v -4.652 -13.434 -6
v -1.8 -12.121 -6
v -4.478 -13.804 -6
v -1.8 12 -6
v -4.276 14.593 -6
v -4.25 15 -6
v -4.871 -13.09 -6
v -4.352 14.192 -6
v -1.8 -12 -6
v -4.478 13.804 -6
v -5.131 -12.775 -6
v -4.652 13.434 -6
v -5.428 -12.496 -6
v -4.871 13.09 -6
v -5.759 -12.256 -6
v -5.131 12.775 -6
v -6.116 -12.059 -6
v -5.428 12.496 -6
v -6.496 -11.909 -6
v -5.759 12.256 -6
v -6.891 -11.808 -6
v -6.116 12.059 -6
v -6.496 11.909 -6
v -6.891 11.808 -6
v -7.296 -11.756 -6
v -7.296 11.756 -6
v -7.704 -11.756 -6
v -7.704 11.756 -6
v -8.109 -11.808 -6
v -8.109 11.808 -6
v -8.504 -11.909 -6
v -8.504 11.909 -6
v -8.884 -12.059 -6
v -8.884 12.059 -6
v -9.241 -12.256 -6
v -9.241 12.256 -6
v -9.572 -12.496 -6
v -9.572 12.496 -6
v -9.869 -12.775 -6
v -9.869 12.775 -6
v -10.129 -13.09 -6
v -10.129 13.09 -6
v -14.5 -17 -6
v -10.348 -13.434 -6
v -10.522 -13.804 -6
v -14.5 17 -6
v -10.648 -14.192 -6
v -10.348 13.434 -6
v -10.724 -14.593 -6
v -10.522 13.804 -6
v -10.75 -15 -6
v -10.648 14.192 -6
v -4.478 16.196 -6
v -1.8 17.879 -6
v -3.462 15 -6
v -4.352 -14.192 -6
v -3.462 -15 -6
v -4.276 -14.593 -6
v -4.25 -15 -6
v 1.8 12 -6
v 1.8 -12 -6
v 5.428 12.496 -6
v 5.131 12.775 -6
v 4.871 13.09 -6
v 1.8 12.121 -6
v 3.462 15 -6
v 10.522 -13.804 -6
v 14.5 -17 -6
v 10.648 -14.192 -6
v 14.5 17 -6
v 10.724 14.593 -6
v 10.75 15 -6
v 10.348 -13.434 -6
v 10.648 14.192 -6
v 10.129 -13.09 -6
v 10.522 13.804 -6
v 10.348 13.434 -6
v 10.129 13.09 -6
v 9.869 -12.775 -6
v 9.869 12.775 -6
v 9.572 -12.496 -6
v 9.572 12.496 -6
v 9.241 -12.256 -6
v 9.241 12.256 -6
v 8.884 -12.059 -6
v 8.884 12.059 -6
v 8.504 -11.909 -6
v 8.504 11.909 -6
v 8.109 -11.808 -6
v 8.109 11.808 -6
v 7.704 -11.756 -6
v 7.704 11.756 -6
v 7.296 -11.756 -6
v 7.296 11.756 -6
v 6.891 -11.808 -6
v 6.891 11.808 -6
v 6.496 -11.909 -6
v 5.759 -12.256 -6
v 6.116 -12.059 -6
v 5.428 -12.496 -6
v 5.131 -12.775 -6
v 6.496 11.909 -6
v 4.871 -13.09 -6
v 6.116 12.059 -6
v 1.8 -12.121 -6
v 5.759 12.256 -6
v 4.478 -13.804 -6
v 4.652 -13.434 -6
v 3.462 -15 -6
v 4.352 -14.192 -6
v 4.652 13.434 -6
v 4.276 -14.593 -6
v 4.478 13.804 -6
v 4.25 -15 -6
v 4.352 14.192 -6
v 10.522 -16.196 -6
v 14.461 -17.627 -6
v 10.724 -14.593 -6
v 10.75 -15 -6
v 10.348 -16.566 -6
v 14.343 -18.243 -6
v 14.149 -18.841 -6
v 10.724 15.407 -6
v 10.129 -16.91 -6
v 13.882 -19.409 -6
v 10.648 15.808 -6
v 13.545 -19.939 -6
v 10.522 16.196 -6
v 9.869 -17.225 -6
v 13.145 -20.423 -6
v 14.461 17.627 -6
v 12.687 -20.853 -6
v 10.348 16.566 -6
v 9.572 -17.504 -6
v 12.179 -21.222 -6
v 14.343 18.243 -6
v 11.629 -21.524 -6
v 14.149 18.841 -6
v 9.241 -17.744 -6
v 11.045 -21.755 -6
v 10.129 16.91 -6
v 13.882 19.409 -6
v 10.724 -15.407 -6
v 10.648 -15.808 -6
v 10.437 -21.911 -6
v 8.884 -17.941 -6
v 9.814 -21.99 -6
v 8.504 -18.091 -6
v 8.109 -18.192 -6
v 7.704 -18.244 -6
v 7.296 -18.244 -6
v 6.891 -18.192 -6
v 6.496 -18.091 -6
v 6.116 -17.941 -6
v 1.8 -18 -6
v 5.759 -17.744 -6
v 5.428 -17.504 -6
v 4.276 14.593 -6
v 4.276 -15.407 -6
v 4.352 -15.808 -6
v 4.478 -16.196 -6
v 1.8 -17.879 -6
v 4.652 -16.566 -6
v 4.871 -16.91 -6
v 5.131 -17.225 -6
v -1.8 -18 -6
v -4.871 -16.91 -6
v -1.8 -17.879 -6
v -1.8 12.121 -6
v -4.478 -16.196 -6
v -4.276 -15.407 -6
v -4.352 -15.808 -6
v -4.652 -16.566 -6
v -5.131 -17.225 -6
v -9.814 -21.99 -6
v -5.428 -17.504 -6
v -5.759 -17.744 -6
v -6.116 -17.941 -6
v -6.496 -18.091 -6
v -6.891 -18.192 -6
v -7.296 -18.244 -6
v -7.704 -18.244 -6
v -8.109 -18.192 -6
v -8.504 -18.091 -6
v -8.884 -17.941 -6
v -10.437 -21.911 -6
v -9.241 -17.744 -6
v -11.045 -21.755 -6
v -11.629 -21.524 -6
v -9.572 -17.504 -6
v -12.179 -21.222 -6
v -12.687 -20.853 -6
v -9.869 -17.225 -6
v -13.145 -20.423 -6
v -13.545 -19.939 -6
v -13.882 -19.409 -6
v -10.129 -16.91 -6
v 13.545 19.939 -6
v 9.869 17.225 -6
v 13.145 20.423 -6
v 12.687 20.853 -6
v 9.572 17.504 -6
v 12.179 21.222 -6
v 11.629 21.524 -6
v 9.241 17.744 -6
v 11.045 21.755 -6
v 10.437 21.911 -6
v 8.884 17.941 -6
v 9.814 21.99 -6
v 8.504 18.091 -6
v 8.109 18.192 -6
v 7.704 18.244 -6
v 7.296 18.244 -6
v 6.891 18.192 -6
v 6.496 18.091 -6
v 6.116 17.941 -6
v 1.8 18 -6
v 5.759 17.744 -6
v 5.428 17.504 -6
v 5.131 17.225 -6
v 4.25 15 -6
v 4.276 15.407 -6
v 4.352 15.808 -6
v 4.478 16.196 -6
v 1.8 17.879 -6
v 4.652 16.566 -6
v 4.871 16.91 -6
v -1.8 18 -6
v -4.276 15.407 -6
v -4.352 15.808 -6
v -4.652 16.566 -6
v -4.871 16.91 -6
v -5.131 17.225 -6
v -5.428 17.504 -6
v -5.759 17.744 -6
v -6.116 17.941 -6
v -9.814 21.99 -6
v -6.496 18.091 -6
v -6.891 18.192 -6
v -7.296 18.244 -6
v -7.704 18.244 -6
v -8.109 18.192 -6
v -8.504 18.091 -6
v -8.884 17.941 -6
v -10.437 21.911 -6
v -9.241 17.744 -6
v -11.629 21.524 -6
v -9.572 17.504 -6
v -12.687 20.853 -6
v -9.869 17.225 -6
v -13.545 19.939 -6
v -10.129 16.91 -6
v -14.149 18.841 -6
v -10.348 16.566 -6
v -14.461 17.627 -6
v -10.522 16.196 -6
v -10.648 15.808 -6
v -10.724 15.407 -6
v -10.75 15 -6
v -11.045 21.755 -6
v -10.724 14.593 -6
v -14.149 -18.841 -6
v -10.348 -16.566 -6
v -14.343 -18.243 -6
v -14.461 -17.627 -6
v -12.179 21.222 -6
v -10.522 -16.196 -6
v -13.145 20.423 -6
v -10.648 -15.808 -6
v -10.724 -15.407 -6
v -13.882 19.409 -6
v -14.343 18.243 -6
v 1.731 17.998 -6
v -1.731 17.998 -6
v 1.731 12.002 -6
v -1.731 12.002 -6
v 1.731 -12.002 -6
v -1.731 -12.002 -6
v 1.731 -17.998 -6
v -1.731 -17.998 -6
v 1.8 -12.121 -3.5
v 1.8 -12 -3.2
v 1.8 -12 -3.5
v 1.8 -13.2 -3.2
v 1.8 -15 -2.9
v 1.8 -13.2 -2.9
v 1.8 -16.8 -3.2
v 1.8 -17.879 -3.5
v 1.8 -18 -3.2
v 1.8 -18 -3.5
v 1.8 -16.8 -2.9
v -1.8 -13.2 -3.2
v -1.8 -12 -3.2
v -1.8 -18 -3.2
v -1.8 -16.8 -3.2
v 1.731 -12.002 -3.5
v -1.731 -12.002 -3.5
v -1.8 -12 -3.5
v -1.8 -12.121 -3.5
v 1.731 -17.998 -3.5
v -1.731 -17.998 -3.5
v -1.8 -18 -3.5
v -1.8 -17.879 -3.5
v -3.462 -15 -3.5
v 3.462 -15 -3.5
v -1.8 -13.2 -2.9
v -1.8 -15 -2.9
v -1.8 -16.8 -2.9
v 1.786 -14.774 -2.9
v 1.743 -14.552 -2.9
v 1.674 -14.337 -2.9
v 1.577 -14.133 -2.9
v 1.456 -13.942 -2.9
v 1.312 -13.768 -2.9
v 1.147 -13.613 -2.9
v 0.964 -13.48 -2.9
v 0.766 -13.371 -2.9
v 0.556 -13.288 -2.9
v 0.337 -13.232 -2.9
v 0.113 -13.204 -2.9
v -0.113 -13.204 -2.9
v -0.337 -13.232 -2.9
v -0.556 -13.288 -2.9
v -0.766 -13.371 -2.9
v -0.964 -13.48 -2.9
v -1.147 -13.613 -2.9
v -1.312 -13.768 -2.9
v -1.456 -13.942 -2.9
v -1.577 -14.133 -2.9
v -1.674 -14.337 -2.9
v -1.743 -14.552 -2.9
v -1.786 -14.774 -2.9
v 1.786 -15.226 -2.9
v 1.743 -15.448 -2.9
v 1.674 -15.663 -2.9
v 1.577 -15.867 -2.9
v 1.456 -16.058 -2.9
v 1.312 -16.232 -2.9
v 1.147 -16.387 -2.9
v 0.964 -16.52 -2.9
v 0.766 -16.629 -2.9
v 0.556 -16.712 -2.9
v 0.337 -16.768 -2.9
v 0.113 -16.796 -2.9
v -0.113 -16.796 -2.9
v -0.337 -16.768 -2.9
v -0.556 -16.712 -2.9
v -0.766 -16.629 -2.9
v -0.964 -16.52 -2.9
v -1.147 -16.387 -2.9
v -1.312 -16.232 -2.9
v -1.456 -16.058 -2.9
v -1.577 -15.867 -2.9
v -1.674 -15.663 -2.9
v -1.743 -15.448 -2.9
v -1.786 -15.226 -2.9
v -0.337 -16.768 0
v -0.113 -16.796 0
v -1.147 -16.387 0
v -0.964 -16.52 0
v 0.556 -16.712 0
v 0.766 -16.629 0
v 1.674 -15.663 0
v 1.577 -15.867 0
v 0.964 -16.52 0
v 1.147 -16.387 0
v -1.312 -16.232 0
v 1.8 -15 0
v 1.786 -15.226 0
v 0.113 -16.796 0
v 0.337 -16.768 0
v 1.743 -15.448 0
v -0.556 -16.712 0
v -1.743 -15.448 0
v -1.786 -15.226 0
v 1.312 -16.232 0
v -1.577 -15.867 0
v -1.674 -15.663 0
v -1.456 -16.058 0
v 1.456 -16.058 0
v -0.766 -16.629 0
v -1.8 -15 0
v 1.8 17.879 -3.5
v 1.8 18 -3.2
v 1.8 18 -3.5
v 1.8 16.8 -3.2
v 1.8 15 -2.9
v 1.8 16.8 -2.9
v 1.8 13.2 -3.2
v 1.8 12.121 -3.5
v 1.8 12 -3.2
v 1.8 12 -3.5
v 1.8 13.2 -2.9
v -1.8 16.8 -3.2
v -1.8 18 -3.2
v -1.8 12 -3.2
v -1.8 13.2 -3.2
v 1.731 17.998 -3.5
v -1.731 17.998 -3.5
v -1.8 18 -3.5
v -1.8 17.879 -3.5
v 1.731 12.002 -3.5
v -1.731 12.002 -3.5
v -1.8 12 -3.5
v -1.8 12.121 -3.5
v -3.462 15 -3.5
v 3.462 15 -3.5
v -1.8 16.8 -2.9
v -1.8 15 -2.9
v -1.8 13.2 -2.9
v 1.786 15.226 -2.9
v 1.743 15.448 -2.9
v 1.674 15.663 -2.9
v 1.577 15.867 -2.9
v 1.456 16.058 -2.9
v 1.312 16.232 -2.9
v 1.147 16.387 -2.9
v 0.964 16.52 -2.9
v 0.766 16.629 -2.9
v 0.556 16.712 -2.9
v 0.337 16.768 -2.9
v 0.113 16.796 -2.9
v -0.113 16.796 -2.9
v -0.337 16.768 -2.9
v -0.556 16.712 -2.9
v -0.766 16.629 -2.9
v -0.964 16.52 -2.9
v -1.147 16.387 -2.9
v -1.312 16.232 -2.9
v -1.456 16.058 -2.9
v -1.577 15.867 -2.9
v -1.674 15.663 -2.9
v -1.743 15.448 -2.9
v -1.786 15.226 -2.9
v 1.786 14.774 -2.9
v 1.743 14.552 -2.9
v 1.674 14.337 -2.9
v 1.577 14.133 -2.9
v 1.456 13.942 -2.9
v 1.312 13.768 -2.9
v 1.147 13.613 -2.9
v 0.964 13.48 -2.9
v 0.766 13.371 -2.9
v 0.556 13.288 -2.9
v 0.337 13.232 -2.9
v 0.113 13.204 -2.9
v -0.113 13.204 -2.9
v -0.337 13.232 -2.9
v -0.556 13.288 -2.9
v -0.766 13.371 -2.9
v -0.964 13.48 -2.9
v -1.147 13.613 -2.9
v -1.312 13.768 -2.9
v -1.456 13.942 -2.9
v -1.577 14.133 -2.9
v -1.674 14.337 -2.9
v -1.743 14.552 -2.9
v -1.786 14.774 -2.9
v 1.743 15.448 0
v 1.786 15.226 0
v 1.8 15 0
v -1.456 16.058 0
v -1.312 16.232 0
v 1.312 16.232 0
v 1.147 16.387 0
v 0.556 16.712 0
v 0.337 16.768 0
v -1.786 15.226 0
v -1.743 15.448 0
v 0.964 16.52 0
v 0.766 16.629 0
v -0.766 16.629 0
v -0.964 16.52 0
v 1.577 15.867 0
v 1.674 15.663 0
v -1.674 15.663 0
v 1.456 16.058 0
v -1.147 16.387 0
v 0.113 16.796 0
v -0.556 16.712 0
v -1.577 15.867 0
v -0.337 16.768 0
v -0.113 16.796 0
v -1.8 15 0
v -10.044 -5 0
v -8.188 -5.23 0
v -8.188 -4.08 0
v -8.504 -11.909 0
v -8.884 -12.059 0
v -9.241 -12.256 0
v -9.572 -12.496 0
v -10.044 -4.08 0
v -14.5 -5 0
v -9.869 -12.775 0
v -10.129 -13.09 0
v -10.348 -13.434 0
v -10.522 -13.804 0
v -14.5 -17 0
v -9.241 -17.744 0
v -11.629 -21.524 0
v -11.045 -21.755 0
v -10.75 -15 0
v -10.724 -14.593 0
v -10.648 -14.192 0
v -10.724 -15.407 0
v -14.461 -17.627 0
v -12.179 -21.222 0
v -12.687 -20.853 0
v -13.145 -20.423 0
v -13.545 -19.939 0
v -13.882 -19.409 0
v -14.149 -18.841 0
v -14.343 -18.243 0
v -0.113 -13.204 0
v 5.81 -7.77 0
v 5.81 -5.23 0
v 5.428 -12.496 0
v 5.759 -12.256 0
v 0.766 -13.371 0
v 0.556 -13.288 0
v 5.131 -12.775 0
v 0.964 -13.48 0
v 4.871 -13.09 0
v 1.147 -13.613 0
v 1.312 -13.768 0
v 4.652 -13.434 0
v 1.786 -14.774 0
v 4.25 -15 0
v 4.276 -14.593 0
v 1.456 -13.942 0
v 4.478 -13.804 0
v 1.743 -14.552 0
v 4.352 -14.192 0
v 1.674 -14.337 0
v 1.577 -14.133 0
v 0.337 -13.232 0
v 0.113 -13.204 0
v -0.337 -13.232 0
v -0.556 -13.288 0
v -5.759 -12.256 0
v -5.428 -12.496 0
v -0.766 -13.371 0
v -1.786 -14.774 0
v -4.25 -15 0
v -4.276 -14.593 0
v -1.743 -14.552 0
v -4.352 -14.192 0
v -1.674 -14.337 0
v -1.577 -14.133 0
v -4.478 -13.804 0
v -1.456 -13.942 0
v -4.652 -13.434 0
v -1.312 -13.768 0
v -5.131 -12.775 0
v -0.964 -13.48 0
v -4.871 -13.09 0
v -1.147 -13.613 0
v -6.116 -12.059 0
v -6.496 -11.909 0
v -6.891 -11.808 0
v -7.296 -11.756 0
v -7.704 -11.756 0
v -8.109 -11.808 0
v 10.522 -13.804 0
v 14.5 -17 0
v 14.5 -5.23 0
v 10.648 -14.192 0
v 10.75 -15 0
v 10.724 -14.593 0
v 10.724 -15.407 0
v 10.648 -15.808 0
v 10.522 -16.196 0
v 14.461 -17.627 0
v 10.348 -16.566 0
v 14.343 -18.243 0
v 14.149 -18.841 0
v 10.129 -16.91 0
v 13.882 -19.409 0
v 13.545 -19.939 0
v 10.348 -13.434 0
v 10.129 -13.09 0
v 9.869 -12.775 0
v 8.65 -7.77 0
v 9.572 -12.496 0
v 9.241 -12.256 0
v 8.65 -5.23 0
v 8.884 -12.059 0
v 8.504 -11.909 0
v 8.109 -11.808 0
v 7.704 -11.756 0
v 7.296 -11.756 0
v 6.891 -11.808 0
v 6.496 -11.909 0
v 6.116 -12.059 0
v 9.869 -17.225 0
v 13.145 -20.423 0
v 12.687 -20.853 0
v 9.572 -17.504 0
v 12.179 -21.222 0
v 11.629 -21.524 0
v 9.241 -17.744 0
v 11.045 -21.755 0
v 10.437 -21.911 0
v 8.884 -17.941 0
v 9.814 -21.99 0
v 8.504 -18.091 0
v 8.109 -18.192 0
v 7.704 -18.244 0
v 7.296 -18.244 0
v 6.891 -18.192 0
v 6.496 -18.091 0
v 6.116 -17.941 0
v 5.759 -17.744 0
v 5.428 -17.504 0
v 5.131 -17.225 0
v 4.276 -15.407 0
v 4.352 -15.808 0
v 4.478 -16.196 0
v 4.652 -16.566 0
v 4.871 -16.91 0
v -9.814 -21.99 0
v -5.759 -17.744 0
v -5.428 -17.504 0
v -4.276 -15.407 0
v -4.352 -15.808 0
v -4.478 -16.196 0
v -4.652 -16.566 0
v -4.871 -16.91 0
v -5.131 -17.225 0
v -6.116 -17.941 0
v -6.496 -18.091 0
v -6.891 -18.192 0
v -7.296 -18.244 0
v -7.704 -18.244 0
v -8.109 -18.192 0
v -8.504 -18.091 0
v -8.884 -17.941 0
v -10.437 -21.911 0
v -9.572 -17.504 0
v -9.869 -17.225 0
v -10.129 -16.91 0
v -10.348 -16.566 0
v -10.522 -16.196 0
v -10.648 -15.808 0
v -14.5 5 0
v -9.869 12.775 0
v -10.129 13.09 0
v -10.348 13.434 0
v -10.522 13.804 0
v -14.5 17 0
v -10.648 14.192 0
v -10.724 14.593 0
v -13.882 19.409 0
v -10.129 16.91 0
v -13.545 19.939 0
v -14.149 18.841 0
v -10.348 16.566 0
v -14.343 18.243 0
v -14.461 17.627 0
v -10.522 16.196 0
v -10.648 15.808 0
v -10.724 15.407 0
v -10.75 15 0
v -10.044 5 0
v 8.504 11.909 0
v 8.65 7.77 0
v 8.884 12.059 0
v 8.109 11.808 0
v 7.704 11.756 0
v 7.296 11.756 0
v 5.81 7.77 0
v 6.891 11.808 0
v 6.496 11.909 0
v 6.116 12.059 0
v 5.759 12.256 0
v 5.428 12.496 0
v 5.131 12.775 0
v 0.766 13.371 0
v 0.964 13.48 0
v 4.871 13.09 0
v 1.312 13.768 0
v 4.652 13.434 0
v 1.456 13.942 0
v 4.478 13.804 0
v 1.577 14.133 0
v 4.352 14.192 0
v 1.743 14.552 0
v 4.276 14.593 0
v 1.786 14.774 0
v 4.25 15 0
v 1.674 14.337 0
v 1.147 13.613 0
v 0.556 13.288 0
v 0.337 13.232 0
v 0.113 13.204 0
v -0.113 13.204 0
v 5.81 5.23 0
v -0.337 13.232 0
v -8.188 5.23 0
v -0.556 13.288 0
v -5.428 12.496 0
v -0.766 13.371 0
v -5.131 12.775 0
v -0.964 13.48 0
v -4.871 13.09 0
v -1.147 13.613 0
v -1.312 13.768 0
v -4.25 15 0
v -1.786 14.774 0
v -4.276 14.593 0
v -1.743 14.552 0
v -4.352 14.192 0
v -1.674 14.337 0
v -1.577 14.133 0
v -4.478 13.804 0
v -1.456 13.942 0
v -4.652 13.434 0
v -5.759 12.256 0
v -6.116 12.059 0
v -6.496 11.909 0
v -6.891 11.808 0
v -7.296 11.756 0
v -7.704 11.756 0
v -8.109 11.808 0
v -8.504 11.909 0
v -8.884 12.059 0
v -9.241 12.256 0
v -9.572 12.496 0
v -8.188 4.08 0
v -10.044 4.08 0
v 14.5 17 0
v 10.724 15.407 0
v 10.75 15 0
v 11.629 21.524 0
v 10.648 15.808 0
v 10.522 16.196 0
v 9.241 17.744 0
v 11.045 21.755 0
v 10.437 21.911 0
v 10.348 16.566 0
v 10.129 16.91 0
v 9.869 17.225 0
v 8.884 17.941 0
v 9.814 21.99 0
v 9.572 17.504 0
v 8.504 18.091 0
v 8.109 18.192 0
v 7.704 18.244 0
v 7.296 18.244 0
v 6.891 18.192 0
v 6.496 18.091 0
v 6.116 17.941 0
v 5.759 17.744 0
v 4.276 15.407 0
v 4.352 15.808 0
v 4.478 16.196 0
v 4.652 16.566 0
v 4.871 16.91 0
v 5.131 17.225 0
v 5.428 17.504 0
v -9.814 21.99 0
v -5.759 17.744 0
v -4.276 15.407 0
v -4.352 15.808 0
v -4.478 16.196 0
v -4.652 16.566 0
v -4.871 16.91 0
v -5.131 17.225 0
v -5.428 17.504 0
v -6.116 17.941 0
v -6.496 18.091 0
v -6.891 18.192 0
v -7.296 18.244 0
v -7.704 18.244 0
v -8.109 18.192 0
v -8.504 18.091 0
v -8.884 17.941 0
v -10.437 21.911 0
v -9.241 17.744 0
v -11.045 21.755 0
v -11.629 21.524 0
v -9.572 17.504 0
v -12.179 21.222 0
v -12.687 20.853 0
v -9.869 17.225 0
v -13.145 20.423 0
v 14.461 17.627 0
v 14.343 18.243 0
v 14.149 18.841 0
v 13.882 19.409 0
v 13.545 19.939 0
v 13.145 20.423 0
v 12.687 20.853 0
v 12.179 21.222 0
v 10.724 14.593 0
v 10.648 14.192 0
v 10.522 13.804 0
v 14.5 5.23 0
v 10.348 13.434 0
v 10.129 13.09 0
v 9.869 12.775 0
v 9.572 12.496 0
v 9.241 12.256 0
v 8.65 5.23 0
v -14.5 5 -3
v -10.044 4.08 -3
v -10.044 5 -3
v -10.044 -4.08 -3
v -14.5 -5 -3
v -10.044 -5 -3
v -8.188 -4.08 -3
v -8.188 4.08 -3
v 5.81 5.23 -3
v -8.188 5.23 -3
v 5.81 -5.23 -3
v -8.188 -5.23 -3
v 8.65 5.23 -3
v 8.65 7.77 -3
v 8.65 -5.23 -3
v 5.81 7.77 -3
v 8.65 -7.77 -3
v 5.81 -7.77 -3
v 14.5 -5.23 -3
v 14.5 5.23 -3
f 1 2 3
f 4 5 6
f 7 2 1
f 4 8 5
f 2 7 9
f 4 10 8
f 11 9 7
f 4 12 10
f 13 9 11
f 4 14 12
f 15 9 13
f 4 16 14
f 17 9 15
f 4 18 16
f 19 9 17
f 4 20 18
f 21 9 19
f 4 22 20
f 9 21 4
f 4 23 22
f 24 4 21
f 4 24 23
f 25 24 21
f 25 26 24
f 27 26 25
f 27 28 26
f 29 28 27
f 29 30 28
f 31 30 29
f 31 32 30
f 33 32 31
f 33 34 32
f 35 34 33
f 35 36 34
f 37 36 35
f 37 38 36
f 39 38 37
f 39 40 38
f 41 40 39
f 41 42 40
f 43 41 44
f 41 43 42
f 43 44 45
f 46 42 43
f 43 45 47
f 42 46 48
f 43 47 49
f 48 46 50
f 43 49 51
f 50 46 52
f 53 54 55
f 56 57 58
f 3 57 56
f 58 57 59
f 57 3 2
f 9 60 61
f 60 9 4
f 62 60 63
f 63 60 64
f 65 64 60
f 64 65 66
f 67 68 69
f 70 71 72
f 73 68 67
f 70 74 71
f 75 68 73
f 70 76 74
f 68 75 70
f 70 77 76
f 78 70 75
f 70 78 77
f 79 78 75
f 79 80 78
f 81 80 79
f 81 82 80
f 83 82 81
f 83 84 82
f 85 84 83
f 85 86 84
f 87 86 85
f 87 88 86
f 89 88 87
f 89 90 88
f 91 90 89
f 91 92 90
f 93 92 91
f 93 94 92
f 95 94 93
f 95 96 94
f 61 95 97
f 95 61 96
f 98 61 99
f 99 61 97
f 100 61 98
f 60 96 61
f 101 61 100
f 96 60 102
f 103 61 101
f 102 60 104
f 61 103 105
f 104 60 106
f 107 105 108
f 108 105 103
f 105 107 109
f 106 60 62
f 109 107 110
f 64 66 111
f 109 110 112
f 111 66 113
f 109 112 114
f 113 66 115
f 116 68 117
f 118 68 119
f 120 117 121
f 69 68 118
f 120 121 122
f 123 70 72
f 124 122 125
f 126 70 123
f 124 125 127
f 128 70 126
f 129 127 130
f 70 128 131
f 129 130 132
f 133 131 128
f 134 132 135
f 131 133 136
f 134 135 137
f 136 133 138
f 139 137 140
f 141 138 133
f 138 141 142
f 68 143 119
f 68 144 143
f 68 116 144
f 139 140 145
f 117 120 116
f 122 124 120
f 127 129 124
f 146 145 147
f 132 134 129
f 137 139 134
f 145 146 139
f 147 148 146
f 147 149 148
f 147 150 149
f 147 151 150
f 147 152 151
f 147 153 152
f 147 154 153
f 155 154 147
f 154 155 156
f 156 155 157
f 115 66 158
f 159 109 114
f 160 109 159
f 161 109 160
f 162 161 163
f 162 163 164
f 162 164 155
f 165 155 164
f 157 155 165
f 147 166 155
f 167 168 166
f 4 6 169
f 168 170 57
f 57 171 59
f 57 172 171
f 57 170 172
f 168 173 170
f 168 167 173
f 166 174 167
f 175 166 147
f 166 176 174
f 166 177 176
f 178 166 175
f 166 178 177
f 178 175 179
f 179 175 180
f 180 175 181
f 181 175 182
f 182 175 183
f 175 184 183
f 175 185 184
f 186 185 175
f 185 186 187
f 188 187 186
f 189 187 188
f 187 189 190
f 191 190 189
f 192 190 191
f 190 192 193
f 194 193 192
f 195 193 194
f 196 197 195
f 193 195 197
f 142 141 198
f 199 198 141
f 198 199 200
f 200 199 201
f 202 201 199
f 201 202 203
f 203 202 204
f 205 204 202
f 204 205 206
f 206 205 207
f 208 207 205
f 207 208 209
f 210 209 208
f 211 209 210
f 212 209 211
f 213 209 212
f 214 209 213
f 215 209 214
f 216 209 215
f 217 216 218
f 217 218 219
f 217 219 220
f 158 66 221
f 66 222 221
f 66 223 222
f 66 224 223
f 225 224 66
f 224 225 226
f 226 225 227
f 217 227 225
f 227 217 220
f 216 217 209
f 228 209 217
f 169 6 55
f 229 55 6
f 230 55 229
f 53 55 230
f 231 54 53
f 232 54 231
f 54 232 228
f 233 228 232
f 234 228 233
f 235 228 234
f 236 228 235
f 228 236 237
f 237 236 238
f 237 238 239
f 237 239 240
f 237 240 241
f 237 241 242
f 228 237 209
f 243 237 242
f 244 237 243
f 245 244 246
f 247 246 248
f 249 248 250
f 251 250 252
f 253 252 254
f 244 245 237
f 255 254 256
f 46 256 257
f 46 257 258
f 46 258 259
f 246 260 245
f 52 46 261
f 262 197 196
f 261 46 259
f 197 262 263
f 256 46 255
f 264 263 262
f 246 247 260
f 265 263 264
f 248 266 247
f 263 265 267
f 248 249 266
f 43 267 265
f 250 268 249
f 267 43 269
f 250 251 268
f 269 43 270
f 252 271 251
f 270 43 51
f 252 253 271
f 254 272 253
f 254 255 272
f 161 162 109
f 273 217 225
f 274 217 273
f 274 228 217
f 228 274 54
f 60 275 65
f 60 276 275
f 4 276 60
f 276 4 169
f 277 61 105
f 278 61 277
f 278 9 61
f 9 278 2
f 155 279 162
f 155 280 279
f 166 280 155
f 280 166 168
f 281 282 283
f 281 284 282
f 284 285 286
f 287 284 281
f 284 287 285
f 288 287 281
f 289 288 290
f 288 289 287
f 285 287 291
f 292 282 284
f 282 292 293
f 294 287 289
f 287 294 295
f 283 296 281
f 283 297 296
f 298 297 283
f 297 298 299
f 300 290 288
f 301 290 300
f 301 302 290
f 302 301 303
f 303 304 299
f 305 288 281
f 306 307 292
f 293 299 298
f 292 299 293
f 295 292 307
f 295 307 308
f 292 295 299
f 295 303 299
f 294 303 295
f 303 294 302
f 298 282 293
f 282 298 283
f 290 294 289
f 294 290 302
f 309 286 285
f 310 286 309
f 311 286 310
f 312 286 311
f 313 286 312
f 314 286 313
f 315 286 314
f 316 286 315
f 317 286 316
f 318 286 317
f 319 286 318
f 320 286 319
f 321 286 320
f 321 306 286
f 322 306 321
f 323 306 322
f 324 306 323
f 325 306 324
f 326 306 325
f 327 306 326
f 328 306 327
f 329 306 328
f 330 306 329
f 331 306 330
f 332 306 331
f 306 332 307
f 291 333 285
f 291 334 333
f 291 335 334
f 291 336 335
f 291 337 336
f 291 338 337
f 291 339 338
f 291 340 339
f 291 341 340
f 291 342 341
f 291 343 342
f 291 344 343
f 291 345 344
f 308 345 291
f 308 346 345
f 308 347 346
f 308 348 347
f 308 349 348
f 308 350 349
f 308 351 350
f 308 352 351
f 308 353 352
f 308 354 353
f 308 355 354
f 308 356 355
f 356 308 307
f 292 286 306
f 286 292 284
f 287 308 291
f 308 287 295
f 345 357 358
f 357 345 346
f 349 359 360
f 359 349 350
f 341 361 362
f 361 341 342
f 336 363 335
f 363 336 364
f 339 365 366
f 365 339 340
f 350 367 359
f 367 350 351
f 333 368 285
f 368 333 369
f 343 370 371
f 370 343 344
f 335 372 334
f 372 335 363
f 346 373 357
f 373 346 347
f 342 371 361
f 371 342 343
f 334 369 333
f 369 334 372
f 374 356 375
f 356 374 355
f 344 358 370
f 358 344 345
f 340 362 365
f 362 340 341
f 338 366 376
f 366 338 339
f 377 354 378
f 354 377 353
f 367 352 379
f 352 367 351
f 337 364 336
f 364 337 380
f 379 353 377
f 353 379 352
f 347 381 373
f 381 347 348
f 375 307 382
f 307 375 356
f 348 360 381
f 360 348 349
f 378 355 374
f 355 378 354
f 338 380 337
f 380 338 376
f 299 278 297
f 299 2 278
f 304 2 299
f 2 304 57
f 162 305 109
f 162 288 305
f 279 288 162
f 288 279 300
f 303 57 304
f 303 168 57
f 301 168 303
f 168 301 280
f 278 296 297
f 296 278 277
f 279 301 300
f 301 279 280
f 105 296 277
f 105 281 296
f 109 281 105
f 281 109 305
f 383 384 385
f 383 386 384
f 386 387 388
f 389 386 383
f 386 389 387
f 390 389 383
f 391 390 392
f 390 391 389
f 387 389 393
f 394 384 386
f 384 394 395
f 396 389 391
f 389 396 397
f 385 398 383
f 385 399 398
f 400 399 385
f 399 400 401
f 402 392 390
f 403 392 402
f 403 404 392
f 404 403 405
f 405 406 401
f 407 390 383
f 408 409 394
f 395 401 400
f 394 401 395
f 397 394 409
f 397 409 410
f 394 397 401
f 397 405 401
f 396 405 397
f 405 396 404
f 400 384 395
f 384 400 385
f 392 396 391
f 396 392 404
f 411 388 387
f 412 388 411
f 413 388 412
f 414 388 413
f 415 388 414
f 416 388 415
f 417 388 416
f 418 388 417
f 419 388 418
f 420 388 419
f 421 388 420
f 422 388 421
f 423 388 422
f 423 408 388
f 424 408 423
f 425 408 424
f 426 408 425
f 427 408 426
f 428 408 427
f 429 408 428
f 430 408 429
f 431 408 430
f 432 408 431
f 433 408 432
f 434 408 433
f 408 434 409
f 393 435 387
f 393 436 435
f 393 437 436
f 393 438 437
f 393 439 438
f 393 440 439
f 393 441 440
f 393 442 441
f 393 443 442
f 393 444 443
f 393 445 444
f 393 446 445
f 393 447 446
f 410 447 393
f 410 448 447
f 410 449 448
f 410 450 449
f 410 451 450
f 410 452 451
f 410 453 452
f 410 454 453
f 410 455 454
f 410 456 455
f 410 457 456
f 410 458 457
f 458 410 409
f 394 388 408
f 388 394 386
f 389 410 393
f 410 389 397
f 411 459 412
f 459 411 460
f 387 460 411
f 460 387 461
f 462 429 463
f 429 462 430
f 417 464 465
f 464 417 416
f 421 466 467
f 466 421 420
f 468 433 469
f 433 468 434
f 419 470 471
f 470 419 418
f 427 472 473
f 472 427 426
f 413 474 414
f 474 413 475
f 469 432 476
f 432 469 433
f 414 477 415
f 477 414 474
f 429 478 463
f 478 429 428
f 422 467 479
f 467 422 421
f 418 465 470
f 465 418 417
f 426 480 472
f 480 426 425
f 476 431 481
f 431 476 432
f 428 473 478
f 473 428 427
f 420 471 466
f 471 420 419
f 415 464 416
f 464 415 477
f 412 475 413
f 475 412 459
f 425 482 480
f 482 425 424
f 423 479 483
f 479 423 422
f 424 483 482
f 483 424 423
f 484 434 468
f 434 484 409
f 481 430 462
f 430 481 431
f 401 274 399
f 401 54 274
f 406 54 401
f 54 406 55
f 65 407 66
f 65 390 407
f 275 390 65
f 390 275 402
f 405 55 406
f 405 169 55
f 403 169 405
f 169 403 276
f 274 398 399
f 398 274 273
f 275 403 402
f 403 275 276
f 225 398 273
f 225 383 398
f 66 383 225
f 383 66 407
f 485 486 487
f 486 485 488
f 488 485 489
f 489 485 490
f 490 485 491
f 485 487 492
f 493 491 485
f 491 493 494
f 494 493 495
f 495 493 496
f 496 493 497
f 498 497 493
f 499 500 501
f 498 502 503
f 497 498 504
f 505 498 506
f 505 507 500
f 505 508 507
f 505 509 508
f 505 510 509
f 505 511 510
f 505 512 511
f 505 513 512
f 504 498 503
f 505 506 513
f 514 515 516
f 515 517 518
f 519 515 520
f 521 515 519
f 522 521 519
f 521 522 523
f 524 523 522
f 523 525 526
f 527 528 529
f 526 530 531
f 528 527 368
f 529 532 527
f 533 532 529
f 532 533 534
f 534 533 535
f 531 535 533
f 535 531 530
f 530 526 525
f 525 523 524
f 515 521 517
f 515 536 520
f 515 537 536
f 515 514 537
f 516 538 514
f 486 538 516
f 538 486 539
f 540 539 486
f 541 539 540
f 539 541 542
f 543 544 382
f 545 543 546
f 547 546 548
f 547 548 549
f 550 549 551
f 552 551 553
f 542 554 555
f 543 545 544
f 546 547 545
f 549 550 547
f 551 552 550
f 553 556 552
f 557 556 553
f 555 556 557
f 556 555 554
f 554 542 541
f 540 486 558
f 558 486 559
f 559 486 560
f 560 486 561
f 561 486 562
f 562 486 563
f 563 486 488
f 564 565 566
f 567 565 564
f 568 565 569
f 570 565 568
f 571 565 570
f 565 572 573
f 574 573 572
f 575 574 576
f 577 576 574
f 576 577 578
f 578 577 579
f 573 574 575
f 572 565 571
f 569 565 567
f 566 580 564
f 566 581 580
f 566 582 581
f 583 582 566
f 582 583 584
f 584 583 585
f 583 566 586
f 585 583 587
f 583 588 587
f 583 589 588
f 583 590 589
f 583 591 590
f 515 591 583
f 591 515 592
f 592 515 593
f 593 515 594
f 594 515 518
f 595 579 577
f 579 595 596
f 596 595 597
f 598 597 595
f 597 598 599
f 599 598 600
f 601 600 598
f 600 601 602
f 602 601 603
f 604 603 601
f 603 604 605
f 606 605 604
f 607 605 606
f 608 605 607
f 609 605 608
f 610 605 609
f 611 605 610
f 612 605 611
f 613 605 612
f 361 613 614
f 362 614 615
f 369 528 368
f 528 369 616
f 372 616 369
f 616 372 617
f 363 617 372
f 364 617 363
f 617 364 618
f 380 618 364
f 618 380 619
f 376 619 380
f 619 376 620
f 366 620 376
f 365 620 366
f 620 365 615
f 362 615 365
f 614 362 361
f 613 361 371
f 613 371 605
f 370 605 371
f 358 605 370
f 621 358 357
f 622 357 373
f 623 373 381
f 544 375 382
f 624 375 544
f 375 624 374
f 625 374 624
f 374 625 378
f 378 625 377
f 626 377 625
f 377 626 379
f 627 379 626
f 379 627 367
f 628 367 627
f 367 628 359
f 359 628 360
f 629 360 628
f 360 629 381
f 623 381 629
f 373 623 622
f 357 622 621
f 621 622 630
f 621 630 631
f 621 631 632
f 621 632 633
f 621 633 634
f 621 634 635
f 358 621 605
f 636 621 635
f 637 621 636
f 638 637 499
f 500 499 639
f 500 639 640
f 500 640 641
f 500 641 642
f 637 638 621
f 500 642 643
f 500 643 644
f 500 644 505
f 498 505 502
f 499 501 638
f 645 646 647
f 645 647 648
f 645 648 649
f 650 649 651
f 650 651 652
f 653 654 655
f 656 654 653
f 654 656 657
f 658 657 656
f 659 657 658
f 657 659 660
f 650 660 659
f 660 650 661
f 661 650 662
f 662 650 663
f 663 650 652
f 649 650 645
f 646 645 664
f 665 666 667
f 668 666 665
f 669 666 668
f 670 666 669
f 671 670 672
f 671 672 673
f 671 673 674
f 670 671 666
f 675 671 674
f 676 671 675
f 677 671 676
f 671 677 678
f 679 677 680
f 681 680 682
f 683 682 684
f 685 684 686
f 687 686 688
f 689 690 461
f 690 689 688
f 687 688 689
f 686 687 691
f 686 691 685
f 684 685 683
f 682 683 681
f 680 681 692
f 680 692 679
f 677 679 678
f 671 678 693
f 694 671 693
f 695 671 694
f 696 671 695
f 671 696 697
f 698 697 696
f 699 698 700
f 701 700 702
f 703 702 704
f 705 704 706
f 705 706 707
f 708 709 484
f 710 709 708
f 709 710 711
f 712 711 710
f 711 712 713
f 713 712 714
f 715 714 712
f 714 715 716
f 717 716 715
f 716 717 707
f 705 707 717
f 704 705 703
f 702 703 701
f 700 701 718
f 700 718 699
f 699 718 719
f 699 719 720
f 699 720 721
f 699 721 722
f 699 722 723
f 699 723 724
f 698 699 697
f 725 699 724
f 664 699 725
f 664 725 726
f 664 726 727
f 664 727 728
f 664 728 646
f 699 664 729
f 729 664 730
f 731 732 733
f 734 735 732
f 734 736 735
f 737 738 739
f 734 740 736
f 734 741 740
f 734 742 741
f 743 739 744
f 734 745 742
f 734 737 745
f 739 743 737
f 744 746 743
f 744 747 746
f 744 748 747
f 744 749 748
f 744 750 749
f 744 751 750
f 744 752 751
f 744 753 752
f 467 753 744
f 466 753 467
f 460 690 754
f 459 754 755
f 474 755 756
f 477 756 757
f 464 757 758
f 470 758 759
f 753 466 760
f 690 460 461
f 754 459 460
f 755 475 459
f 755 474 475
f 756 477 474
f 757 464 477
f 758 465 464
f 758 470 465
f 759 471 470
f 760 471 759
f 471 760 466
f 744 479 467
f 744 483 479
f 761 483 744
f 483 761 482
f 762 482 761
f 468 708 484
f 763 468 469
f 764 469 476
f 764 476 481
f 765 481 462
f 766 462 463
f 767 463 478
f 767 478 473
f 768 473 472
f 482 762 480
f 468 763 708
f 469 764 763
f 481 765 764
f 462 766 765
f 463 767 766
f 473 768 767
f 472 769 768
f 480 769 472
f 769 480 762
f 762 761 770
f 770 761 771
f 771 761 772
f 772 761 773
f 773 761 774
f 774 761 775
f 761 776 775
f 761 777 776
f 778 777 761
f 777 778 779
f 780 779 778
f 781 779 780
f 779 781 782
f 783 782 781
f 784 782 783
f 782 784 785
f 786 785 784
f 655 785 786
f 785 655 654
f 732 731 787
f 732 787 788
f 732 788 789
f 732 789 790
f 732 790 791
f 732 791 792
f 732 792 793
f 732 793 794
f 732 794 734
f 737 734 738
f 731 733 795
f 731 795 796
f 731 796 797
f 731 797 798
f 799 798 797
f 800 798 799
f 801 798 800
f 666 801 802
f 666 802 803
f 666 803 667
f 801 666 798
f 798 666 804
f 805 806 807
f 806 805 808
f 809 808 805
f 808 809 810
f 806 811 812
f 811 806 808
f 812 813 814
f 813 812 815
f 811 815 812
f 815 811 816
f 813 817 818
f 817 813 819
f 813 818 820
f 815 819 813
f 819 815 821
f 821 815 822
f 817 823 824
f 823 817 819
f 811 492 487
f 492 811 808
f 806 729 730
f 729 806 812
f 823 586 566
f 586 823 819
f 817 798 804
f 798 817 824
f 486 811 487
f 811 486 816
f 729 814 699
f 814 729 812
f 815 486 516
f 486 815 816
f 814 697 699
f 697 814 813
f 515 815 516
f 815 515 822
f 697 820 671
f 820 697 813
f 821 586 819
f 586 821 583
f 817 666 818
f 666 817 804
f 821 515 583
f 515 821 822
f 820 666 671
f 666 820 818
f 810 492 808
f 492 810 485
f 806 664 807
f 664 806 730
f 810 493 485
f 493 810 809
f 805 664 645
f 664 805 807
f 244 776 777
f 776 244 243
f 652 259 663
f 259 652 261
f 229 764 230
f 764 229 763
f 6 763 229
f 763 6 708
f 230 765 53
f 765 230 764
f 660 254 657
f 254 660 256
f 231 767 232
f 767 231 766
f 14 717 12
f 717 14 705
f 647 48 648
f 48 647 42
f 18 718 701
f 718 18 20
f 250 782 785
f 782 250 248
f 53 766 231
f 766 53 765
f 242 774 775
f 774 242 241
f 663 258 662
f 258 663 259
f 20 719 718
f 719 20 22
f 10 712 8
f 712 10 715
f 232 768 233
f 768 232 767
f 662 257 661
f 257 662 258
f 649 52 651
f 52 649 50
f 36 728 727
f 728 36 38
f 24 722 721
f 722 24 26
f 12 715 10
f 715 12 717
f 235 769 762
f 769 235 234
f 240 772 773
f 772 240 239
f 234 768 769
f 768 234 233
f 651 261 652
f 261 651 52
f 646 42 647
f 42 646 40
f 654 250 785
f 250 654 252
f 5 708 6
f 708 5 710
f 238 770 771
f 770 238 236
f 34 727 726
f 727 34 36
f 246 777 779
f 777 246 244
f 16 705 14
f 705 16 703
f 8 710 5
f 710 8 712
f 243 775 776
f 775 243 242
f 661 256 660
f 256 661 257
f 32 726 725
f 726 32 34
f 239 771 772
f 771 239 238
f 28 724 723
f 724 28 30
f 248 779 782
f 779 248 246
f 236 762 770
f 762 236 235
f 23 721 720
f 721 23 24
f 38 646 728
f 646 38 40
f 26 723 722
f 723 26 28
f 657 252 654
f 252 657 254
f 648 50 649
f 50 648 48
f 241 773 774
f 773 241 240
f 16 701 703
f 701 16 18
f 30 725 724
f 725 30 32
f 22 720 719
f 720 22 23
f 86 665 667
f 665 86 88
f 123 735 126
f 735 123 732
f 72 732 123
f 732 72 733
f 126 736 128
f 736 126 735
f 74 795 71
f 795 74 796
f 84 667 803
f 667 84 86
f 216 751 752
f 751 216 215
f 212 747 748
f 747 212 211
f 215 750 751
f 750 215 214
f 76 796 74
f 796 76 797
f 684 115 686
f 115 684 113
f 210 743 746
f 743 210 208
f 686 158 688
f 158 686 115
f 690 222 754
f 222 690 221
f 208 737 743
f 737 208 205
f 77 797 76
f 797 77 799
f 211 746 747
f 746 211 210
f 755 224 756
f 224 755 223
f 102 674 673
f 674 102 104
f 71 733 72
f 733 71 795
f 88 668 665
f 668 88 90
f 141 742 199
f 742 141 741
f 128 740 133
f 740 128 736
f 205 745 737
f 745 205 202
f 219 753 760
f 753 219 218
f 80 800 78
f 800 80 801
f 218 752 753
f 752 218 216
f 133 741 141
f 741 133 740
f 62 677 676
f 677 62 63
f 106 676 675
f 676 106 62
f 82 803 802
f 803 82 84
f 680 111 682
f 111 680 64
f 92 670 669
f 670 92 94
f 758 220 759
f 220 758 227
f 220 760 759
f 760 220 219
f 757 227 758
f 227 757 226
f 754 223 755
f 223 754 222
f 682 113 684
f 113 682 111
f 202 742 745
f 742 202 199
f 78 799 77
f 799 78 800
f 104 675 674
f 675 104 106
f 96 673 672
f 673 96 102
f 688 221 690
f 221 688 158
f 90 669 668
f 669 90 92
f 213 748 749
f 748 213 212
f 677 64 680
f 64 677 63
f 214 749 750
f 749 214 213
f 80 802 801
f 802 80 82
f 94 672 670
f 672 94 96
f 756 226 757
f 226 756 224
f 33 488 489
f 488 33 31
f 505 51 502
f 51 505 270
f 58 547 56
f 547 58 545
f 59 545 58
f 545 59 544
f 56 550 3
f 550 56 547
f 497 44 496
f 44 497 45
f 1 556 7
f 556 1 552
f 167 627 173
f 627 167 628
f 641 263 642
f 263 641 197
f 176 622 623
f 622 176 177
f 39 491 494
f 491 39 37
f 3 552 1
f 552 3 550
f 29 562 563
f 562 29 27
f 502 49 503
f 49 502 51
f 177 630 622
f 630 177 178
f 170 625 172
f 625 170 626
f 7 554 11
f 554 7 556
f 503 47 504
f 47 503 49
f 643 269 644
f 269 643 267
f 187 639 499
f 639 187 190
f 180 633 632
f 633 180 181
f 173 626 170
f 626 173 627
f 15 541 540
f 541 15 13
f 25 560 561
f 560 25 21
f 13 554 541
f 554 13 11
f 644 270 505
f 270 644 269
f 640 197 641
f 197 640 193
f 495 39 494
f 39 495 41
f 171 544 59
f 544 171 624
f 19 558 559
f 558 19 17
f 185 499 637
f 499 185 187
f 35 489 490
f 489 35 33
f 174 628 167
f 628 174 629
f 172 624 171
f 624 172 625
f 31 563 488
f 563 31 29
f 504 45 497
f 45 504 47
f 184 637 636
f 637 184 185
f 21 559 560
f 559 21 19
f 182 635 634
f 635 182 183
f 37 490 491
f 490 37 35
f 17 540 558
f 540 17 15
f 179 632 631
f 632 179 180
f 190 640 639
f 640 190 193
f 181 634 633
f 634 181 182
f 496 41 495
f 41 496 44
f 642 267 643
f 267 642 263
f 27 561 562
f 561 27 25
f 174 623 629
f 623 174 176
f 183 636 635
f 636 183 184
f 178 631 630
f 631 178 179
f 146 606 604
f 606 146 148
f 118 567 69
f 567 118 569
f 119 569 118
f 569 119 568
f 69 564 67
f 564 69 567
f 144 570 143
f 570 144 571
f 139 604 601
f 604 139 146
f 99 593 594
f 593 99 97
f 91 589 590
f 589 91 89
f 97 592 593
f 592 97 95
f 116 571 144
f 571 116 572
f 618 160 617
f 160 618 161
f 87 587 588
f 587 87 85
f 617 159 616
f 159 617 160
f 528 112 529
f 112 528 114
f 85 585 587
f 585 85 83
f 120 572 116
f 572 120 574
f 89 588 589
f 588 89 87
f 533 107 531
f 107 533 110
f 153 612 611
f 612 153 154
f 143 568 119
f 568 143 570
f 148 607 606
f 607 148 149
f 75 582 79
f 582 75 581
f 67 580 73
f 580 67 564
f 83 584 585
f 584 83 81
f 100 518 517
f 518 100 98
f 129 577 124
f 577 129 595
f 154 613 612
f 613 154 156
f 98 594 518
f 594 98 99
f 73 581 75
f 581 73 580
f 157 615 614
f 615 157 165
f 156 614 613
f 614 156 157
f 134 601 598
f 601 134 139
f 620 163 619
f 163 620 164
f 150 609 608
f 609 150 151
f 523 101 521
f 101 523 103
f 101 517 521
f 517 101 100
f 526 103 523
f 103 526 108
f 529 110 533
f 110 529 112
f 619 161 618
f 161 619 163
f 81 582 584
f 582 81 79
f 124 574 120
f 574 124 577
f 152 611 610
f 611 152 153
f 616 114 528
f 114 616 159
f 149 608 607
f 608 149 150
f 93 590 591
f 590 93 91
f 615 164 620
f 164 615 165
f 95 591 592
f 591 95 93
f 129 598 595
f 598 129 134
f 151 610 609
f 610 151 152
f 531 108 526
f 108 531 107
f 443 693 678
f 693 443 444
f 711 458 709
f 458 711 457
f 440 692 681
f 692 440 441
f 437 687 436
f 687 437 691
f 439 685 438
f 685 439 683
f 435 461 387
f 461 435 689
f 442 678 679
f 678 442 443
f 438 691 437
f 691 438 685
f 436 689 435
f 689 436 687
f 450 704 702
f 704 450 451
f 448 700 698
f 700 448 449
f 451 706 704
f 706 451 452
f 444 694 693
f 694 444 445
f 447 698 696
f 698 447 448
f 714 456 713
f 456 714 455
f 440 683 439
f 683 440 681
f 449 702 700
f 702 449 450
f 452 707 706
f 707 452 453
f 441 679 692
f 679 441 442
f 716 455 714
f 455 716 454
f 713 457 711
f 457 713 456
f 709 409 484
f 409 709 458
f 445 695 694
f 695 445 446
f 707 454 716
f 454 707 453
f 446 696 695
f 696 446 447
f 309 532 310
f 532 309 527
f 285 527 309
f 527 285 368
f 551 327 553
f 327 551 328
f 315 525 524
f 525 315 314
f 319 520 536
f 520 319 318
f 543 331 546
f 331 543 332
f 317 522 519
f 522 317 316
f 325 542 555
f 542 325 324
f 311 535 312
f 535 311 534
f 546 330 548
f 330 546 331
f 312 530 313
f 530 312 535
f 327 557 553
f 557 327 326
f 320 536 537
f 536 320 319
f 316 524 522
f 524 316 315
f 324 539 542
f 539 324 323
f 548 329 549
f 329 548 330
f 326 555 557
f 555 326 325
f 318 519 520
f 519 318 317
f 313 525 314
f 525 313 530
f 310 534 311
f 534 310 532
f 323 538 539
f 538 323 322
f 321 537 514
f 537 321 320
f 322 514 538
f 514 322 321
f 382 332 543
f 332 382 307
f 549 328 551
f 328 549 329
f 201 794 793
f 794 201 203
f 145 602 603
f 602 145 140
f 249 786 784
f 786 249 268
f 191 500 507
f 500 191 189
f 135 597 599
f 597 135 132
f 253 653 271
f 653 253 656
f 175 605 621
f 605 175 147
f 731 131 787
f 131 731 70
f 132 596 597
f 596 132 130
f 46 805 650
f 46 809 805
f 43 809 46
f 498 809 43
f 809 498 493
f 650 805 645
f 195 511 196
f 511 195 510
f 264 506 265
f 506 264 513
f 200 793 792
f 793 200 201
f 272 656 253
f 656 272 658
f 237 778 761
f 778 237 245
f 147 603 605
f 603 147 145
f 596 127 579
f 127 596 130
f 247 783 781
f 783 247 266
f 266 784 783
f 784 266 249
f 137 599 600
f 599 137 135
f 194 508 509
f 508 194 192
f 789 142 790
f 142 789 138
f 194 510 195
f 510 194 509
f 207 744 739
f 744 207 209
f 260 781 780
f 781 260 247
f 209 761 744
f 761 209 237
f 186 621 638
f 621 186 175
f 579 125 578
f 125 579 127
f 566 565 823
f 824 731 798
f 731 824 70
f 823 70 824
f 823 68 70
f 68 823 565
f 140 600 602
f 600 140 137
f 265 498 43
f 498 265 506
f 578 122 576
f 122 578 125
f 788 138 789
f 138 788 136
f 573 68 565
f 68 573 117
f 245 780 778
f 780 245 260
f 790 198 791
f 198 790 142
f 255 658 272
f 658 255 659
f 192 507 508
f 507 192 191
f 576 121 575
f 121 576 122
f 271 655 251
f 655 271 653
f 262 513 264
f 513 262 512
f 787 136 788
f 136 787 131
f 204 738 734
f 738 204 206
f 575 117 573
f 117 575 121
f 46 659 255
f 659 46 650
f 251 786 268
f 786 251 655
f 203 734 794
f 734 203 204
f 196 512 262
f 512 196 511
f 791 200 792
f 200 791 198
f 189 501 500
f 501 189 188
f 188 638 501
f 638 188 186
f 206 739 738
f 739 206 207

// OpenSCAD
$fn = 50;


difference() {
	union() {
		*color(alpha = 1.0000000000, c = "gray") {
			translate(v = [0, 14, -6]) {
				linear_extrude(height = 3) {
					text(font = "Arial:style=Bold", halign = "center", size = 4.5000000000, text = "COMMENT description oobb_plate_shape_positive_type_6_depth_0_0_-6_pos_motor_stepper_extra_6_thickness_2_width_3_height_0_0_-6_pos_plate", valign = "center");
				}
			}
		}
		translate(v = [0, 0, -6]) {
			hull() {
				translate(v = [-9.5000000000, 17.0000000000, 0]) {
					cylinder(h = 6, r = 5);
				}
				translate(v = [9.5000000000, 17.0000000000, 0]) {
					cylinder(h = 6, r = 5);
				}
				translate(v = [-9.5000000000, -17.0000000000, 0]) {
					cylinder(h = 6, r = 5);
				}
				translate(v = [9.5000000000, -17.0000000000, 0]) {
					cylinder(h = 6, r = 5);
				}
			}
		}
		*color(alpha = 1.0000000000, c = "gray") {
			translate(v = [0, 14, -6]) {
				linear_extrude(height = 3) {
					text(font = "Arial:style=Bold", halign = "center", size = 4.5000000000, text = "COMMENT description oobb_holes_shape_p_type_0_0_-6_pos_motor_stepper_extra_6_thickness_2_width_3_height_0_0_-6_pos_plate_'left'_'right'_hole_sides_'left'_'right'_holes_true_both_holes", valign = "center");
				}
			}
		}
		*color(alpha = 1.0000000000, c = "gray") {
			translate(v = [-7.5000000000, 14, -3]) {
				rotate(a = [0, 0, 180]) {
					linear_extrude(height = 3) {
						text(font = "Arial:style=Bold", halign = "center", size = 4.5000000000, text = "COMMENT description oobb_wire_motor_stepper_shape_-7.5_0_-3_pos_motor_stepper_extra_6_thickness_2_width_3_height_0_0_-6_pos_plate_0_0_180_rot", valign = "center");
					}
				}
			}
		}
	}
	union() {
		translate(v = [0, -15, -6]) {
			rotate(a = [0, 0, 0]) {
				difference() {
					union() {
						translate(v = [-1.8000000000, -3.0000000000, -0.3000000000]) {
							cube(size = [3.6000000000, 6.0000000000, 0.3000000000]);
						}
						translate(v = [-1.8000000000, -1.8000000000, -0.6000000000]) {
							cube(size = [3.6000000000, 3.6000000000, 0.3000000000]);
						}
						translate(v = [-1.8000000000, -3.0000000000, 2.5000000000]) {
							cube(size = [3.6000000000, 6.0000000000, 0.3000000000]);
						}
						translate(v = [-1.8000000000, -1.8000000000, 2.8000000000]) {
							cube(size = [3.6000000000, 3.6000000000, 0.3000000000]);
						}
						translate(v = [0, 0, -50.0000000000]) {
							cylinder(h = 100, r = 1.8000000000);
						}
						linear_extrude(height = 2.5000000000) {
							polygon(points = [[3.4620000000, 0.0000000000], [1.7310000000, 2.9981799479], [-1.7310000000, 2.9981799479], [-3.4620000000, 0.0000000000], [-1.7310000000, -2.9981799479], [1.7310000000, -2.9981799479]]);
						}
						translate(v = [-1.8000000000, -3.0000000000, -0.3000000000]) {
							cube(size = [3.6000000000, 6.0000000000, 0.3000000000]);
						}
						translate(v = [-1.8000000000, -1.8000000000, -0.6000000000]) {
							cube(size = [3.6000000000, 3.6000000000, 0.3000000000]);
						}
						translate(v = [-1.8000000000, -3.0000000000, 2.5000000000]) {
							cube(size = [3.6000000000, 6.0000000000, 0.3000000000]);
						}
						translate(v = [-1.8000000000, -1.8000000000, 2.8000000000]) {
							cube(size = [3.6000000000, 3.6000000000, 0.3000000000]);
						}
						translate(v = [0, 0, -50.0000000000]) {
							cylinder(h = 100, r = 1.8000000000);
						}
						translate(v = [-1.8000000000, -3.0000000000, -0.3000000000]) {
							cube(size = [3.6000000000, 6.0000000000, 0.3000000000]);
						}
						translate(v = [-1.8000000000, -1.8000000000, -0.6000000000]) {
							cube(size = [3.6000000000, 3.6000000000, 0.3000000000]);
						}
						translate(v = [-1.8000000000, -3.0000000000, 2.5000000000]) {
							cube(size = [3.6000000000, 6.0000000000, 0.3000000000]);
						}
						translate(v = [-1.8000000000, -1.8000000000, 2.8000000000]) {
							cube(size = [3.6000000000, 3.6000000000, 0.3000000000]);
						}
						translate(v = [0, 0, -50.0000000000]) {
							cylinder(h = 100, r = 1.8000000000);
						}
					}
					union();
				}
			}
		}
		translate(v = [0, 15, -6]) {
			rotate(a = [0, 0, 0]) {
				difference() {
					union() {
						translate(v = [-1.8000000000, -3.0000000000, -0.3000000000]) {
							cube(size = [3.6000000000, 6.0000000000, 0.3000000000]);
						}
						translate(v = [-1.8000000000, -1.8000000000, -0.6000000000]) {
							cube(size = [3.6000000000, 3.6000000000, 0.3000000000]);
						}
						translate(v = [-1.8000000000, -3.0000000000, 2.5000000000]) {
							cube(size = [3.6000000000, 6.0000000000, 0.3000000000]);
						}
						translate(v = [-1.8000000000, -1.8000000000, 2.8000000000]) {
							cube(size = [3.6000000000, 3.6000000000, 0.3000000000]);
						}
						translate(v = [0, 0, -50.0000000000]) {
							cylinder(h = 100, r = 1.8000000000);
						}
						linear_extrude(height = 2.5000000000) {
							polygon(points = [[3.4620000000, 0.0000000000], [1.7310000000, 2.9981799479], [-1.7310000000, 2.9981799479], [-3.4620000000, 0.0000000000], [-1.7310000000, -2.9981799479], [1.7310000000, -2.9981799479]]);
						}
						translate(v = [-1.8000000000, -3.0000000000, -0.3000000000]) {
							cube(size = [3.6000000000, 6.0000000000, 0.3000000000]);
						}
						translate(v = [-1.8000000000, -1.8000000000, -0.6000000000]) {
							cube(size = [3.6000000000, 3.6000000000, 0.3000000000]);
						}
						translate(v = [-1.8000000000, -3.0000000000, 2.5000000000]) {
							cube(size = [3.6000000000, 6.0000000000, 0.3000000000]);
						}
						translate(v = [-1.8000000000, -1.8000000000, 2.8000000000]) {
							cube(size = [3.6000000000, 3.6000000000, 0.3000000000]);
						}
						translate(v = [0, 0, -50.0000000000]) {
							cylinder(h = 100, r = 1.8000000000);
						}
						translate(v = [-1.8000000000, -3.0000000000, -0.3000000000]) {
							cube(size = [3.6000000000, 6.0000000000, 0.3000000000]);
						}
						translate(v = [-1.8000000000, -1.8000000000, -0.6000000000]) {
							cube(size = [3.6000000000, 3.6000000000, 0.3000000000]);
						}
						translate(v = [-1.8000000000, -3.0000000000, 2.5000000000]) {
							cube(size = [3.6000000000, 6.0000000000, 0.3000000000]);
						}
						translate(v = [-1.8000000000, -1.8000000000, 2.8000000000]) {
							cube(size = [3.6000000000, 3.6000000000, 0.3000000000]);
						}
						translate(v = [0, 0, -50.0000000000]) {
							cylinder(h = 100, r = 1.8000000000);
						}
					}
					union();
				}
			}
		}
		translate(v = [15.0000000000, 0, -3]) {
			rotate(a = [0, 0, 180]) {
				difference() {
					union() {
						#translate(v = [23.0670000000, -4.0800000000, 0]) {
							cube(size = [5, 8.1600000000, 3]);
						}
						#translate(v = [0.2040000000, -5.2300000000, 0]) {
							cube(size = [6.3000000000, 10.4600000000, 3]);
						}
						#translate(v = [8.8880000000, -5.2300000000, 0]) {
							cube(size = [14.3000000000, 10.4600000000, 3]);
						}
						#translate(v = [6.3500000000, -7.7700000000, 0]) {
							cube(size = [2.8400000000, 15.5400000000, 3]);
						}
						#translate(v = [25.0440000000, -5.0000000000, 0]) {
							cube(size = [7, 10, 3]);
						}
					}
					union();
				}
			}
		}
		translate(v = [-7.5000000000, 15.0000000000, -50.0000000000]) {
			cylinder(h = 100, r = 3.2500000000);
		}
		translate(v = [7.5000000000, 15.0000000000, -50.0000000000]) {
			cylinder(h = 100, r = 3.2500000000);
		}
		translate(v = [-7.5000000000, -15.0000000000, -50.0000000000]) {
			cylinder(h = 100, r = 3.2500000000);
		}
		translate(v = [7.5000000000, -15.0000000000, -50.0000000000]) {
			cylinder(h = 100, r = 3.2500000000);
		}
		translate(v = [-7.5000000000, 15.0000000000, -50.0000000000]) {
			cylinder(h = 100, r = 1.8000000000);
		}
		translate(v = [0.0000000000, 15.0000000000, -50.0000000000]) {
			cylinder(h = 100, r = 1.8000000000);
		}
		translate(v = [7.5000000000, 15.0000000000, -50.0000000000]) {
			cylinder(h = 100, r = 1.8000000000);
		}
		translate(v = [-7.5000000000, -15.0000000000, -50.0000000000]) {
			cylinder(h = 100, r = 1.8000000000);
		}
		translate(v = [0.0000000000, -15.0000000000, -50.0000000000]) {
			cylinder(h = 100, r = 1.8000000000);
		}
		translate(v = [7.5000000000, -15.0000000000, -50.0000000000]) {
			cylinder(h = 100, r = 1.8000000000);
		}
		translate(v = [-7.5000000000, 15.0000000000, -50.0000000000]) {
			cylinder(h = 100, r = 1.8000000000);
		}
		translate(v = [0.0000000000, 15.0000000000, -50.0000000000]) {
			cylinder(h = 100, r = 1.8000000000);
		}
		translate(v = [7.5000000000, 15.0000000000, -50.0000000000]) {
			cylinder(h = 100, r = 1.8000000000);
		}
		translate(v = [-7.5000000000, -15.0000000000, -50.0000000000]) {
			cylinder(h = 100, r = 1.8000000000);
		}
		translate(v = [0.0000000000, -15.0000000000, -50.0000000000]) {
			cylinder(h = 100, r = 1.8000000000);
		}
		translate(v = [7.5000000000, -15.0000000000, -50.0000000000]) {
			cylinder(h = 100, r = 1.8000000000);
		}
		translate(v = [-7.5000000000, 15.0000000000, -50.0000000000]) {
			cylinder(h = 100, r = 1.8000000000);
		}
		translate(v = [0.0000000000, 15.0000000000, -50.0000000000]) {
			cylinder(h = 100, r = 1.8000000000);
		}
		translate(v = [7.5000000000, 15.0000000000, -50.0000000000]) {
			cylinder(h = 100, r = 1.8000000000);
		}
		translate(v = [-7.5000000000, -15.0000000000, -50.0000000000]) {
			cylinder(h = 100, r = 1.8000000000);
		}
		translate(v = [0.0000000000, -15.0000000000, -50.0000000000]) {
			cylinder(h = 100, r = 1.8000000000);
		}
		translate(v = [7.5000000000, -15.0000000000, -50.0000000000]) {
			cylinder(h = 100, r = 1.8000000000);
		}
		*color(alpha = 1.0000000000, c = "gray") {
			translate(v = [0, -1, -6]) {
				linear_extrude(height = 3) {
					text(font = "Arial:style=Bold", halign = "center", size = 4.5000000000, text = "COMMENT description oobb_nut_shape_negative_type_m3_radius_name_0_-15_-6_pos_6_thickness_2_width_3_height_0_0_-6_pos_plate_bottom_zz_true_overhang_0_0_0_rot_false_nut_true_hole", valign = "center");
				}
			}
		}
		*color(alpha = 1.0000000000, c = "gray") {
			translate(v = [0, 29, -6]) {
				linear_extrude(height = 3) {
					text(font = "Arial:style=Bold", halign = "center", size = 4.5000000000, text = "COMMENT description oobb_nut_shape_negative_type_m3_radius_name_0_15_-6_pos_6_thickness_2_width_3_height_0_0_-6_pos_plate_bottom_zz_true_overhang_0_0_0_rot_false_nut_true_hole", valign = "center");
				}
			}
		}
	}
}
